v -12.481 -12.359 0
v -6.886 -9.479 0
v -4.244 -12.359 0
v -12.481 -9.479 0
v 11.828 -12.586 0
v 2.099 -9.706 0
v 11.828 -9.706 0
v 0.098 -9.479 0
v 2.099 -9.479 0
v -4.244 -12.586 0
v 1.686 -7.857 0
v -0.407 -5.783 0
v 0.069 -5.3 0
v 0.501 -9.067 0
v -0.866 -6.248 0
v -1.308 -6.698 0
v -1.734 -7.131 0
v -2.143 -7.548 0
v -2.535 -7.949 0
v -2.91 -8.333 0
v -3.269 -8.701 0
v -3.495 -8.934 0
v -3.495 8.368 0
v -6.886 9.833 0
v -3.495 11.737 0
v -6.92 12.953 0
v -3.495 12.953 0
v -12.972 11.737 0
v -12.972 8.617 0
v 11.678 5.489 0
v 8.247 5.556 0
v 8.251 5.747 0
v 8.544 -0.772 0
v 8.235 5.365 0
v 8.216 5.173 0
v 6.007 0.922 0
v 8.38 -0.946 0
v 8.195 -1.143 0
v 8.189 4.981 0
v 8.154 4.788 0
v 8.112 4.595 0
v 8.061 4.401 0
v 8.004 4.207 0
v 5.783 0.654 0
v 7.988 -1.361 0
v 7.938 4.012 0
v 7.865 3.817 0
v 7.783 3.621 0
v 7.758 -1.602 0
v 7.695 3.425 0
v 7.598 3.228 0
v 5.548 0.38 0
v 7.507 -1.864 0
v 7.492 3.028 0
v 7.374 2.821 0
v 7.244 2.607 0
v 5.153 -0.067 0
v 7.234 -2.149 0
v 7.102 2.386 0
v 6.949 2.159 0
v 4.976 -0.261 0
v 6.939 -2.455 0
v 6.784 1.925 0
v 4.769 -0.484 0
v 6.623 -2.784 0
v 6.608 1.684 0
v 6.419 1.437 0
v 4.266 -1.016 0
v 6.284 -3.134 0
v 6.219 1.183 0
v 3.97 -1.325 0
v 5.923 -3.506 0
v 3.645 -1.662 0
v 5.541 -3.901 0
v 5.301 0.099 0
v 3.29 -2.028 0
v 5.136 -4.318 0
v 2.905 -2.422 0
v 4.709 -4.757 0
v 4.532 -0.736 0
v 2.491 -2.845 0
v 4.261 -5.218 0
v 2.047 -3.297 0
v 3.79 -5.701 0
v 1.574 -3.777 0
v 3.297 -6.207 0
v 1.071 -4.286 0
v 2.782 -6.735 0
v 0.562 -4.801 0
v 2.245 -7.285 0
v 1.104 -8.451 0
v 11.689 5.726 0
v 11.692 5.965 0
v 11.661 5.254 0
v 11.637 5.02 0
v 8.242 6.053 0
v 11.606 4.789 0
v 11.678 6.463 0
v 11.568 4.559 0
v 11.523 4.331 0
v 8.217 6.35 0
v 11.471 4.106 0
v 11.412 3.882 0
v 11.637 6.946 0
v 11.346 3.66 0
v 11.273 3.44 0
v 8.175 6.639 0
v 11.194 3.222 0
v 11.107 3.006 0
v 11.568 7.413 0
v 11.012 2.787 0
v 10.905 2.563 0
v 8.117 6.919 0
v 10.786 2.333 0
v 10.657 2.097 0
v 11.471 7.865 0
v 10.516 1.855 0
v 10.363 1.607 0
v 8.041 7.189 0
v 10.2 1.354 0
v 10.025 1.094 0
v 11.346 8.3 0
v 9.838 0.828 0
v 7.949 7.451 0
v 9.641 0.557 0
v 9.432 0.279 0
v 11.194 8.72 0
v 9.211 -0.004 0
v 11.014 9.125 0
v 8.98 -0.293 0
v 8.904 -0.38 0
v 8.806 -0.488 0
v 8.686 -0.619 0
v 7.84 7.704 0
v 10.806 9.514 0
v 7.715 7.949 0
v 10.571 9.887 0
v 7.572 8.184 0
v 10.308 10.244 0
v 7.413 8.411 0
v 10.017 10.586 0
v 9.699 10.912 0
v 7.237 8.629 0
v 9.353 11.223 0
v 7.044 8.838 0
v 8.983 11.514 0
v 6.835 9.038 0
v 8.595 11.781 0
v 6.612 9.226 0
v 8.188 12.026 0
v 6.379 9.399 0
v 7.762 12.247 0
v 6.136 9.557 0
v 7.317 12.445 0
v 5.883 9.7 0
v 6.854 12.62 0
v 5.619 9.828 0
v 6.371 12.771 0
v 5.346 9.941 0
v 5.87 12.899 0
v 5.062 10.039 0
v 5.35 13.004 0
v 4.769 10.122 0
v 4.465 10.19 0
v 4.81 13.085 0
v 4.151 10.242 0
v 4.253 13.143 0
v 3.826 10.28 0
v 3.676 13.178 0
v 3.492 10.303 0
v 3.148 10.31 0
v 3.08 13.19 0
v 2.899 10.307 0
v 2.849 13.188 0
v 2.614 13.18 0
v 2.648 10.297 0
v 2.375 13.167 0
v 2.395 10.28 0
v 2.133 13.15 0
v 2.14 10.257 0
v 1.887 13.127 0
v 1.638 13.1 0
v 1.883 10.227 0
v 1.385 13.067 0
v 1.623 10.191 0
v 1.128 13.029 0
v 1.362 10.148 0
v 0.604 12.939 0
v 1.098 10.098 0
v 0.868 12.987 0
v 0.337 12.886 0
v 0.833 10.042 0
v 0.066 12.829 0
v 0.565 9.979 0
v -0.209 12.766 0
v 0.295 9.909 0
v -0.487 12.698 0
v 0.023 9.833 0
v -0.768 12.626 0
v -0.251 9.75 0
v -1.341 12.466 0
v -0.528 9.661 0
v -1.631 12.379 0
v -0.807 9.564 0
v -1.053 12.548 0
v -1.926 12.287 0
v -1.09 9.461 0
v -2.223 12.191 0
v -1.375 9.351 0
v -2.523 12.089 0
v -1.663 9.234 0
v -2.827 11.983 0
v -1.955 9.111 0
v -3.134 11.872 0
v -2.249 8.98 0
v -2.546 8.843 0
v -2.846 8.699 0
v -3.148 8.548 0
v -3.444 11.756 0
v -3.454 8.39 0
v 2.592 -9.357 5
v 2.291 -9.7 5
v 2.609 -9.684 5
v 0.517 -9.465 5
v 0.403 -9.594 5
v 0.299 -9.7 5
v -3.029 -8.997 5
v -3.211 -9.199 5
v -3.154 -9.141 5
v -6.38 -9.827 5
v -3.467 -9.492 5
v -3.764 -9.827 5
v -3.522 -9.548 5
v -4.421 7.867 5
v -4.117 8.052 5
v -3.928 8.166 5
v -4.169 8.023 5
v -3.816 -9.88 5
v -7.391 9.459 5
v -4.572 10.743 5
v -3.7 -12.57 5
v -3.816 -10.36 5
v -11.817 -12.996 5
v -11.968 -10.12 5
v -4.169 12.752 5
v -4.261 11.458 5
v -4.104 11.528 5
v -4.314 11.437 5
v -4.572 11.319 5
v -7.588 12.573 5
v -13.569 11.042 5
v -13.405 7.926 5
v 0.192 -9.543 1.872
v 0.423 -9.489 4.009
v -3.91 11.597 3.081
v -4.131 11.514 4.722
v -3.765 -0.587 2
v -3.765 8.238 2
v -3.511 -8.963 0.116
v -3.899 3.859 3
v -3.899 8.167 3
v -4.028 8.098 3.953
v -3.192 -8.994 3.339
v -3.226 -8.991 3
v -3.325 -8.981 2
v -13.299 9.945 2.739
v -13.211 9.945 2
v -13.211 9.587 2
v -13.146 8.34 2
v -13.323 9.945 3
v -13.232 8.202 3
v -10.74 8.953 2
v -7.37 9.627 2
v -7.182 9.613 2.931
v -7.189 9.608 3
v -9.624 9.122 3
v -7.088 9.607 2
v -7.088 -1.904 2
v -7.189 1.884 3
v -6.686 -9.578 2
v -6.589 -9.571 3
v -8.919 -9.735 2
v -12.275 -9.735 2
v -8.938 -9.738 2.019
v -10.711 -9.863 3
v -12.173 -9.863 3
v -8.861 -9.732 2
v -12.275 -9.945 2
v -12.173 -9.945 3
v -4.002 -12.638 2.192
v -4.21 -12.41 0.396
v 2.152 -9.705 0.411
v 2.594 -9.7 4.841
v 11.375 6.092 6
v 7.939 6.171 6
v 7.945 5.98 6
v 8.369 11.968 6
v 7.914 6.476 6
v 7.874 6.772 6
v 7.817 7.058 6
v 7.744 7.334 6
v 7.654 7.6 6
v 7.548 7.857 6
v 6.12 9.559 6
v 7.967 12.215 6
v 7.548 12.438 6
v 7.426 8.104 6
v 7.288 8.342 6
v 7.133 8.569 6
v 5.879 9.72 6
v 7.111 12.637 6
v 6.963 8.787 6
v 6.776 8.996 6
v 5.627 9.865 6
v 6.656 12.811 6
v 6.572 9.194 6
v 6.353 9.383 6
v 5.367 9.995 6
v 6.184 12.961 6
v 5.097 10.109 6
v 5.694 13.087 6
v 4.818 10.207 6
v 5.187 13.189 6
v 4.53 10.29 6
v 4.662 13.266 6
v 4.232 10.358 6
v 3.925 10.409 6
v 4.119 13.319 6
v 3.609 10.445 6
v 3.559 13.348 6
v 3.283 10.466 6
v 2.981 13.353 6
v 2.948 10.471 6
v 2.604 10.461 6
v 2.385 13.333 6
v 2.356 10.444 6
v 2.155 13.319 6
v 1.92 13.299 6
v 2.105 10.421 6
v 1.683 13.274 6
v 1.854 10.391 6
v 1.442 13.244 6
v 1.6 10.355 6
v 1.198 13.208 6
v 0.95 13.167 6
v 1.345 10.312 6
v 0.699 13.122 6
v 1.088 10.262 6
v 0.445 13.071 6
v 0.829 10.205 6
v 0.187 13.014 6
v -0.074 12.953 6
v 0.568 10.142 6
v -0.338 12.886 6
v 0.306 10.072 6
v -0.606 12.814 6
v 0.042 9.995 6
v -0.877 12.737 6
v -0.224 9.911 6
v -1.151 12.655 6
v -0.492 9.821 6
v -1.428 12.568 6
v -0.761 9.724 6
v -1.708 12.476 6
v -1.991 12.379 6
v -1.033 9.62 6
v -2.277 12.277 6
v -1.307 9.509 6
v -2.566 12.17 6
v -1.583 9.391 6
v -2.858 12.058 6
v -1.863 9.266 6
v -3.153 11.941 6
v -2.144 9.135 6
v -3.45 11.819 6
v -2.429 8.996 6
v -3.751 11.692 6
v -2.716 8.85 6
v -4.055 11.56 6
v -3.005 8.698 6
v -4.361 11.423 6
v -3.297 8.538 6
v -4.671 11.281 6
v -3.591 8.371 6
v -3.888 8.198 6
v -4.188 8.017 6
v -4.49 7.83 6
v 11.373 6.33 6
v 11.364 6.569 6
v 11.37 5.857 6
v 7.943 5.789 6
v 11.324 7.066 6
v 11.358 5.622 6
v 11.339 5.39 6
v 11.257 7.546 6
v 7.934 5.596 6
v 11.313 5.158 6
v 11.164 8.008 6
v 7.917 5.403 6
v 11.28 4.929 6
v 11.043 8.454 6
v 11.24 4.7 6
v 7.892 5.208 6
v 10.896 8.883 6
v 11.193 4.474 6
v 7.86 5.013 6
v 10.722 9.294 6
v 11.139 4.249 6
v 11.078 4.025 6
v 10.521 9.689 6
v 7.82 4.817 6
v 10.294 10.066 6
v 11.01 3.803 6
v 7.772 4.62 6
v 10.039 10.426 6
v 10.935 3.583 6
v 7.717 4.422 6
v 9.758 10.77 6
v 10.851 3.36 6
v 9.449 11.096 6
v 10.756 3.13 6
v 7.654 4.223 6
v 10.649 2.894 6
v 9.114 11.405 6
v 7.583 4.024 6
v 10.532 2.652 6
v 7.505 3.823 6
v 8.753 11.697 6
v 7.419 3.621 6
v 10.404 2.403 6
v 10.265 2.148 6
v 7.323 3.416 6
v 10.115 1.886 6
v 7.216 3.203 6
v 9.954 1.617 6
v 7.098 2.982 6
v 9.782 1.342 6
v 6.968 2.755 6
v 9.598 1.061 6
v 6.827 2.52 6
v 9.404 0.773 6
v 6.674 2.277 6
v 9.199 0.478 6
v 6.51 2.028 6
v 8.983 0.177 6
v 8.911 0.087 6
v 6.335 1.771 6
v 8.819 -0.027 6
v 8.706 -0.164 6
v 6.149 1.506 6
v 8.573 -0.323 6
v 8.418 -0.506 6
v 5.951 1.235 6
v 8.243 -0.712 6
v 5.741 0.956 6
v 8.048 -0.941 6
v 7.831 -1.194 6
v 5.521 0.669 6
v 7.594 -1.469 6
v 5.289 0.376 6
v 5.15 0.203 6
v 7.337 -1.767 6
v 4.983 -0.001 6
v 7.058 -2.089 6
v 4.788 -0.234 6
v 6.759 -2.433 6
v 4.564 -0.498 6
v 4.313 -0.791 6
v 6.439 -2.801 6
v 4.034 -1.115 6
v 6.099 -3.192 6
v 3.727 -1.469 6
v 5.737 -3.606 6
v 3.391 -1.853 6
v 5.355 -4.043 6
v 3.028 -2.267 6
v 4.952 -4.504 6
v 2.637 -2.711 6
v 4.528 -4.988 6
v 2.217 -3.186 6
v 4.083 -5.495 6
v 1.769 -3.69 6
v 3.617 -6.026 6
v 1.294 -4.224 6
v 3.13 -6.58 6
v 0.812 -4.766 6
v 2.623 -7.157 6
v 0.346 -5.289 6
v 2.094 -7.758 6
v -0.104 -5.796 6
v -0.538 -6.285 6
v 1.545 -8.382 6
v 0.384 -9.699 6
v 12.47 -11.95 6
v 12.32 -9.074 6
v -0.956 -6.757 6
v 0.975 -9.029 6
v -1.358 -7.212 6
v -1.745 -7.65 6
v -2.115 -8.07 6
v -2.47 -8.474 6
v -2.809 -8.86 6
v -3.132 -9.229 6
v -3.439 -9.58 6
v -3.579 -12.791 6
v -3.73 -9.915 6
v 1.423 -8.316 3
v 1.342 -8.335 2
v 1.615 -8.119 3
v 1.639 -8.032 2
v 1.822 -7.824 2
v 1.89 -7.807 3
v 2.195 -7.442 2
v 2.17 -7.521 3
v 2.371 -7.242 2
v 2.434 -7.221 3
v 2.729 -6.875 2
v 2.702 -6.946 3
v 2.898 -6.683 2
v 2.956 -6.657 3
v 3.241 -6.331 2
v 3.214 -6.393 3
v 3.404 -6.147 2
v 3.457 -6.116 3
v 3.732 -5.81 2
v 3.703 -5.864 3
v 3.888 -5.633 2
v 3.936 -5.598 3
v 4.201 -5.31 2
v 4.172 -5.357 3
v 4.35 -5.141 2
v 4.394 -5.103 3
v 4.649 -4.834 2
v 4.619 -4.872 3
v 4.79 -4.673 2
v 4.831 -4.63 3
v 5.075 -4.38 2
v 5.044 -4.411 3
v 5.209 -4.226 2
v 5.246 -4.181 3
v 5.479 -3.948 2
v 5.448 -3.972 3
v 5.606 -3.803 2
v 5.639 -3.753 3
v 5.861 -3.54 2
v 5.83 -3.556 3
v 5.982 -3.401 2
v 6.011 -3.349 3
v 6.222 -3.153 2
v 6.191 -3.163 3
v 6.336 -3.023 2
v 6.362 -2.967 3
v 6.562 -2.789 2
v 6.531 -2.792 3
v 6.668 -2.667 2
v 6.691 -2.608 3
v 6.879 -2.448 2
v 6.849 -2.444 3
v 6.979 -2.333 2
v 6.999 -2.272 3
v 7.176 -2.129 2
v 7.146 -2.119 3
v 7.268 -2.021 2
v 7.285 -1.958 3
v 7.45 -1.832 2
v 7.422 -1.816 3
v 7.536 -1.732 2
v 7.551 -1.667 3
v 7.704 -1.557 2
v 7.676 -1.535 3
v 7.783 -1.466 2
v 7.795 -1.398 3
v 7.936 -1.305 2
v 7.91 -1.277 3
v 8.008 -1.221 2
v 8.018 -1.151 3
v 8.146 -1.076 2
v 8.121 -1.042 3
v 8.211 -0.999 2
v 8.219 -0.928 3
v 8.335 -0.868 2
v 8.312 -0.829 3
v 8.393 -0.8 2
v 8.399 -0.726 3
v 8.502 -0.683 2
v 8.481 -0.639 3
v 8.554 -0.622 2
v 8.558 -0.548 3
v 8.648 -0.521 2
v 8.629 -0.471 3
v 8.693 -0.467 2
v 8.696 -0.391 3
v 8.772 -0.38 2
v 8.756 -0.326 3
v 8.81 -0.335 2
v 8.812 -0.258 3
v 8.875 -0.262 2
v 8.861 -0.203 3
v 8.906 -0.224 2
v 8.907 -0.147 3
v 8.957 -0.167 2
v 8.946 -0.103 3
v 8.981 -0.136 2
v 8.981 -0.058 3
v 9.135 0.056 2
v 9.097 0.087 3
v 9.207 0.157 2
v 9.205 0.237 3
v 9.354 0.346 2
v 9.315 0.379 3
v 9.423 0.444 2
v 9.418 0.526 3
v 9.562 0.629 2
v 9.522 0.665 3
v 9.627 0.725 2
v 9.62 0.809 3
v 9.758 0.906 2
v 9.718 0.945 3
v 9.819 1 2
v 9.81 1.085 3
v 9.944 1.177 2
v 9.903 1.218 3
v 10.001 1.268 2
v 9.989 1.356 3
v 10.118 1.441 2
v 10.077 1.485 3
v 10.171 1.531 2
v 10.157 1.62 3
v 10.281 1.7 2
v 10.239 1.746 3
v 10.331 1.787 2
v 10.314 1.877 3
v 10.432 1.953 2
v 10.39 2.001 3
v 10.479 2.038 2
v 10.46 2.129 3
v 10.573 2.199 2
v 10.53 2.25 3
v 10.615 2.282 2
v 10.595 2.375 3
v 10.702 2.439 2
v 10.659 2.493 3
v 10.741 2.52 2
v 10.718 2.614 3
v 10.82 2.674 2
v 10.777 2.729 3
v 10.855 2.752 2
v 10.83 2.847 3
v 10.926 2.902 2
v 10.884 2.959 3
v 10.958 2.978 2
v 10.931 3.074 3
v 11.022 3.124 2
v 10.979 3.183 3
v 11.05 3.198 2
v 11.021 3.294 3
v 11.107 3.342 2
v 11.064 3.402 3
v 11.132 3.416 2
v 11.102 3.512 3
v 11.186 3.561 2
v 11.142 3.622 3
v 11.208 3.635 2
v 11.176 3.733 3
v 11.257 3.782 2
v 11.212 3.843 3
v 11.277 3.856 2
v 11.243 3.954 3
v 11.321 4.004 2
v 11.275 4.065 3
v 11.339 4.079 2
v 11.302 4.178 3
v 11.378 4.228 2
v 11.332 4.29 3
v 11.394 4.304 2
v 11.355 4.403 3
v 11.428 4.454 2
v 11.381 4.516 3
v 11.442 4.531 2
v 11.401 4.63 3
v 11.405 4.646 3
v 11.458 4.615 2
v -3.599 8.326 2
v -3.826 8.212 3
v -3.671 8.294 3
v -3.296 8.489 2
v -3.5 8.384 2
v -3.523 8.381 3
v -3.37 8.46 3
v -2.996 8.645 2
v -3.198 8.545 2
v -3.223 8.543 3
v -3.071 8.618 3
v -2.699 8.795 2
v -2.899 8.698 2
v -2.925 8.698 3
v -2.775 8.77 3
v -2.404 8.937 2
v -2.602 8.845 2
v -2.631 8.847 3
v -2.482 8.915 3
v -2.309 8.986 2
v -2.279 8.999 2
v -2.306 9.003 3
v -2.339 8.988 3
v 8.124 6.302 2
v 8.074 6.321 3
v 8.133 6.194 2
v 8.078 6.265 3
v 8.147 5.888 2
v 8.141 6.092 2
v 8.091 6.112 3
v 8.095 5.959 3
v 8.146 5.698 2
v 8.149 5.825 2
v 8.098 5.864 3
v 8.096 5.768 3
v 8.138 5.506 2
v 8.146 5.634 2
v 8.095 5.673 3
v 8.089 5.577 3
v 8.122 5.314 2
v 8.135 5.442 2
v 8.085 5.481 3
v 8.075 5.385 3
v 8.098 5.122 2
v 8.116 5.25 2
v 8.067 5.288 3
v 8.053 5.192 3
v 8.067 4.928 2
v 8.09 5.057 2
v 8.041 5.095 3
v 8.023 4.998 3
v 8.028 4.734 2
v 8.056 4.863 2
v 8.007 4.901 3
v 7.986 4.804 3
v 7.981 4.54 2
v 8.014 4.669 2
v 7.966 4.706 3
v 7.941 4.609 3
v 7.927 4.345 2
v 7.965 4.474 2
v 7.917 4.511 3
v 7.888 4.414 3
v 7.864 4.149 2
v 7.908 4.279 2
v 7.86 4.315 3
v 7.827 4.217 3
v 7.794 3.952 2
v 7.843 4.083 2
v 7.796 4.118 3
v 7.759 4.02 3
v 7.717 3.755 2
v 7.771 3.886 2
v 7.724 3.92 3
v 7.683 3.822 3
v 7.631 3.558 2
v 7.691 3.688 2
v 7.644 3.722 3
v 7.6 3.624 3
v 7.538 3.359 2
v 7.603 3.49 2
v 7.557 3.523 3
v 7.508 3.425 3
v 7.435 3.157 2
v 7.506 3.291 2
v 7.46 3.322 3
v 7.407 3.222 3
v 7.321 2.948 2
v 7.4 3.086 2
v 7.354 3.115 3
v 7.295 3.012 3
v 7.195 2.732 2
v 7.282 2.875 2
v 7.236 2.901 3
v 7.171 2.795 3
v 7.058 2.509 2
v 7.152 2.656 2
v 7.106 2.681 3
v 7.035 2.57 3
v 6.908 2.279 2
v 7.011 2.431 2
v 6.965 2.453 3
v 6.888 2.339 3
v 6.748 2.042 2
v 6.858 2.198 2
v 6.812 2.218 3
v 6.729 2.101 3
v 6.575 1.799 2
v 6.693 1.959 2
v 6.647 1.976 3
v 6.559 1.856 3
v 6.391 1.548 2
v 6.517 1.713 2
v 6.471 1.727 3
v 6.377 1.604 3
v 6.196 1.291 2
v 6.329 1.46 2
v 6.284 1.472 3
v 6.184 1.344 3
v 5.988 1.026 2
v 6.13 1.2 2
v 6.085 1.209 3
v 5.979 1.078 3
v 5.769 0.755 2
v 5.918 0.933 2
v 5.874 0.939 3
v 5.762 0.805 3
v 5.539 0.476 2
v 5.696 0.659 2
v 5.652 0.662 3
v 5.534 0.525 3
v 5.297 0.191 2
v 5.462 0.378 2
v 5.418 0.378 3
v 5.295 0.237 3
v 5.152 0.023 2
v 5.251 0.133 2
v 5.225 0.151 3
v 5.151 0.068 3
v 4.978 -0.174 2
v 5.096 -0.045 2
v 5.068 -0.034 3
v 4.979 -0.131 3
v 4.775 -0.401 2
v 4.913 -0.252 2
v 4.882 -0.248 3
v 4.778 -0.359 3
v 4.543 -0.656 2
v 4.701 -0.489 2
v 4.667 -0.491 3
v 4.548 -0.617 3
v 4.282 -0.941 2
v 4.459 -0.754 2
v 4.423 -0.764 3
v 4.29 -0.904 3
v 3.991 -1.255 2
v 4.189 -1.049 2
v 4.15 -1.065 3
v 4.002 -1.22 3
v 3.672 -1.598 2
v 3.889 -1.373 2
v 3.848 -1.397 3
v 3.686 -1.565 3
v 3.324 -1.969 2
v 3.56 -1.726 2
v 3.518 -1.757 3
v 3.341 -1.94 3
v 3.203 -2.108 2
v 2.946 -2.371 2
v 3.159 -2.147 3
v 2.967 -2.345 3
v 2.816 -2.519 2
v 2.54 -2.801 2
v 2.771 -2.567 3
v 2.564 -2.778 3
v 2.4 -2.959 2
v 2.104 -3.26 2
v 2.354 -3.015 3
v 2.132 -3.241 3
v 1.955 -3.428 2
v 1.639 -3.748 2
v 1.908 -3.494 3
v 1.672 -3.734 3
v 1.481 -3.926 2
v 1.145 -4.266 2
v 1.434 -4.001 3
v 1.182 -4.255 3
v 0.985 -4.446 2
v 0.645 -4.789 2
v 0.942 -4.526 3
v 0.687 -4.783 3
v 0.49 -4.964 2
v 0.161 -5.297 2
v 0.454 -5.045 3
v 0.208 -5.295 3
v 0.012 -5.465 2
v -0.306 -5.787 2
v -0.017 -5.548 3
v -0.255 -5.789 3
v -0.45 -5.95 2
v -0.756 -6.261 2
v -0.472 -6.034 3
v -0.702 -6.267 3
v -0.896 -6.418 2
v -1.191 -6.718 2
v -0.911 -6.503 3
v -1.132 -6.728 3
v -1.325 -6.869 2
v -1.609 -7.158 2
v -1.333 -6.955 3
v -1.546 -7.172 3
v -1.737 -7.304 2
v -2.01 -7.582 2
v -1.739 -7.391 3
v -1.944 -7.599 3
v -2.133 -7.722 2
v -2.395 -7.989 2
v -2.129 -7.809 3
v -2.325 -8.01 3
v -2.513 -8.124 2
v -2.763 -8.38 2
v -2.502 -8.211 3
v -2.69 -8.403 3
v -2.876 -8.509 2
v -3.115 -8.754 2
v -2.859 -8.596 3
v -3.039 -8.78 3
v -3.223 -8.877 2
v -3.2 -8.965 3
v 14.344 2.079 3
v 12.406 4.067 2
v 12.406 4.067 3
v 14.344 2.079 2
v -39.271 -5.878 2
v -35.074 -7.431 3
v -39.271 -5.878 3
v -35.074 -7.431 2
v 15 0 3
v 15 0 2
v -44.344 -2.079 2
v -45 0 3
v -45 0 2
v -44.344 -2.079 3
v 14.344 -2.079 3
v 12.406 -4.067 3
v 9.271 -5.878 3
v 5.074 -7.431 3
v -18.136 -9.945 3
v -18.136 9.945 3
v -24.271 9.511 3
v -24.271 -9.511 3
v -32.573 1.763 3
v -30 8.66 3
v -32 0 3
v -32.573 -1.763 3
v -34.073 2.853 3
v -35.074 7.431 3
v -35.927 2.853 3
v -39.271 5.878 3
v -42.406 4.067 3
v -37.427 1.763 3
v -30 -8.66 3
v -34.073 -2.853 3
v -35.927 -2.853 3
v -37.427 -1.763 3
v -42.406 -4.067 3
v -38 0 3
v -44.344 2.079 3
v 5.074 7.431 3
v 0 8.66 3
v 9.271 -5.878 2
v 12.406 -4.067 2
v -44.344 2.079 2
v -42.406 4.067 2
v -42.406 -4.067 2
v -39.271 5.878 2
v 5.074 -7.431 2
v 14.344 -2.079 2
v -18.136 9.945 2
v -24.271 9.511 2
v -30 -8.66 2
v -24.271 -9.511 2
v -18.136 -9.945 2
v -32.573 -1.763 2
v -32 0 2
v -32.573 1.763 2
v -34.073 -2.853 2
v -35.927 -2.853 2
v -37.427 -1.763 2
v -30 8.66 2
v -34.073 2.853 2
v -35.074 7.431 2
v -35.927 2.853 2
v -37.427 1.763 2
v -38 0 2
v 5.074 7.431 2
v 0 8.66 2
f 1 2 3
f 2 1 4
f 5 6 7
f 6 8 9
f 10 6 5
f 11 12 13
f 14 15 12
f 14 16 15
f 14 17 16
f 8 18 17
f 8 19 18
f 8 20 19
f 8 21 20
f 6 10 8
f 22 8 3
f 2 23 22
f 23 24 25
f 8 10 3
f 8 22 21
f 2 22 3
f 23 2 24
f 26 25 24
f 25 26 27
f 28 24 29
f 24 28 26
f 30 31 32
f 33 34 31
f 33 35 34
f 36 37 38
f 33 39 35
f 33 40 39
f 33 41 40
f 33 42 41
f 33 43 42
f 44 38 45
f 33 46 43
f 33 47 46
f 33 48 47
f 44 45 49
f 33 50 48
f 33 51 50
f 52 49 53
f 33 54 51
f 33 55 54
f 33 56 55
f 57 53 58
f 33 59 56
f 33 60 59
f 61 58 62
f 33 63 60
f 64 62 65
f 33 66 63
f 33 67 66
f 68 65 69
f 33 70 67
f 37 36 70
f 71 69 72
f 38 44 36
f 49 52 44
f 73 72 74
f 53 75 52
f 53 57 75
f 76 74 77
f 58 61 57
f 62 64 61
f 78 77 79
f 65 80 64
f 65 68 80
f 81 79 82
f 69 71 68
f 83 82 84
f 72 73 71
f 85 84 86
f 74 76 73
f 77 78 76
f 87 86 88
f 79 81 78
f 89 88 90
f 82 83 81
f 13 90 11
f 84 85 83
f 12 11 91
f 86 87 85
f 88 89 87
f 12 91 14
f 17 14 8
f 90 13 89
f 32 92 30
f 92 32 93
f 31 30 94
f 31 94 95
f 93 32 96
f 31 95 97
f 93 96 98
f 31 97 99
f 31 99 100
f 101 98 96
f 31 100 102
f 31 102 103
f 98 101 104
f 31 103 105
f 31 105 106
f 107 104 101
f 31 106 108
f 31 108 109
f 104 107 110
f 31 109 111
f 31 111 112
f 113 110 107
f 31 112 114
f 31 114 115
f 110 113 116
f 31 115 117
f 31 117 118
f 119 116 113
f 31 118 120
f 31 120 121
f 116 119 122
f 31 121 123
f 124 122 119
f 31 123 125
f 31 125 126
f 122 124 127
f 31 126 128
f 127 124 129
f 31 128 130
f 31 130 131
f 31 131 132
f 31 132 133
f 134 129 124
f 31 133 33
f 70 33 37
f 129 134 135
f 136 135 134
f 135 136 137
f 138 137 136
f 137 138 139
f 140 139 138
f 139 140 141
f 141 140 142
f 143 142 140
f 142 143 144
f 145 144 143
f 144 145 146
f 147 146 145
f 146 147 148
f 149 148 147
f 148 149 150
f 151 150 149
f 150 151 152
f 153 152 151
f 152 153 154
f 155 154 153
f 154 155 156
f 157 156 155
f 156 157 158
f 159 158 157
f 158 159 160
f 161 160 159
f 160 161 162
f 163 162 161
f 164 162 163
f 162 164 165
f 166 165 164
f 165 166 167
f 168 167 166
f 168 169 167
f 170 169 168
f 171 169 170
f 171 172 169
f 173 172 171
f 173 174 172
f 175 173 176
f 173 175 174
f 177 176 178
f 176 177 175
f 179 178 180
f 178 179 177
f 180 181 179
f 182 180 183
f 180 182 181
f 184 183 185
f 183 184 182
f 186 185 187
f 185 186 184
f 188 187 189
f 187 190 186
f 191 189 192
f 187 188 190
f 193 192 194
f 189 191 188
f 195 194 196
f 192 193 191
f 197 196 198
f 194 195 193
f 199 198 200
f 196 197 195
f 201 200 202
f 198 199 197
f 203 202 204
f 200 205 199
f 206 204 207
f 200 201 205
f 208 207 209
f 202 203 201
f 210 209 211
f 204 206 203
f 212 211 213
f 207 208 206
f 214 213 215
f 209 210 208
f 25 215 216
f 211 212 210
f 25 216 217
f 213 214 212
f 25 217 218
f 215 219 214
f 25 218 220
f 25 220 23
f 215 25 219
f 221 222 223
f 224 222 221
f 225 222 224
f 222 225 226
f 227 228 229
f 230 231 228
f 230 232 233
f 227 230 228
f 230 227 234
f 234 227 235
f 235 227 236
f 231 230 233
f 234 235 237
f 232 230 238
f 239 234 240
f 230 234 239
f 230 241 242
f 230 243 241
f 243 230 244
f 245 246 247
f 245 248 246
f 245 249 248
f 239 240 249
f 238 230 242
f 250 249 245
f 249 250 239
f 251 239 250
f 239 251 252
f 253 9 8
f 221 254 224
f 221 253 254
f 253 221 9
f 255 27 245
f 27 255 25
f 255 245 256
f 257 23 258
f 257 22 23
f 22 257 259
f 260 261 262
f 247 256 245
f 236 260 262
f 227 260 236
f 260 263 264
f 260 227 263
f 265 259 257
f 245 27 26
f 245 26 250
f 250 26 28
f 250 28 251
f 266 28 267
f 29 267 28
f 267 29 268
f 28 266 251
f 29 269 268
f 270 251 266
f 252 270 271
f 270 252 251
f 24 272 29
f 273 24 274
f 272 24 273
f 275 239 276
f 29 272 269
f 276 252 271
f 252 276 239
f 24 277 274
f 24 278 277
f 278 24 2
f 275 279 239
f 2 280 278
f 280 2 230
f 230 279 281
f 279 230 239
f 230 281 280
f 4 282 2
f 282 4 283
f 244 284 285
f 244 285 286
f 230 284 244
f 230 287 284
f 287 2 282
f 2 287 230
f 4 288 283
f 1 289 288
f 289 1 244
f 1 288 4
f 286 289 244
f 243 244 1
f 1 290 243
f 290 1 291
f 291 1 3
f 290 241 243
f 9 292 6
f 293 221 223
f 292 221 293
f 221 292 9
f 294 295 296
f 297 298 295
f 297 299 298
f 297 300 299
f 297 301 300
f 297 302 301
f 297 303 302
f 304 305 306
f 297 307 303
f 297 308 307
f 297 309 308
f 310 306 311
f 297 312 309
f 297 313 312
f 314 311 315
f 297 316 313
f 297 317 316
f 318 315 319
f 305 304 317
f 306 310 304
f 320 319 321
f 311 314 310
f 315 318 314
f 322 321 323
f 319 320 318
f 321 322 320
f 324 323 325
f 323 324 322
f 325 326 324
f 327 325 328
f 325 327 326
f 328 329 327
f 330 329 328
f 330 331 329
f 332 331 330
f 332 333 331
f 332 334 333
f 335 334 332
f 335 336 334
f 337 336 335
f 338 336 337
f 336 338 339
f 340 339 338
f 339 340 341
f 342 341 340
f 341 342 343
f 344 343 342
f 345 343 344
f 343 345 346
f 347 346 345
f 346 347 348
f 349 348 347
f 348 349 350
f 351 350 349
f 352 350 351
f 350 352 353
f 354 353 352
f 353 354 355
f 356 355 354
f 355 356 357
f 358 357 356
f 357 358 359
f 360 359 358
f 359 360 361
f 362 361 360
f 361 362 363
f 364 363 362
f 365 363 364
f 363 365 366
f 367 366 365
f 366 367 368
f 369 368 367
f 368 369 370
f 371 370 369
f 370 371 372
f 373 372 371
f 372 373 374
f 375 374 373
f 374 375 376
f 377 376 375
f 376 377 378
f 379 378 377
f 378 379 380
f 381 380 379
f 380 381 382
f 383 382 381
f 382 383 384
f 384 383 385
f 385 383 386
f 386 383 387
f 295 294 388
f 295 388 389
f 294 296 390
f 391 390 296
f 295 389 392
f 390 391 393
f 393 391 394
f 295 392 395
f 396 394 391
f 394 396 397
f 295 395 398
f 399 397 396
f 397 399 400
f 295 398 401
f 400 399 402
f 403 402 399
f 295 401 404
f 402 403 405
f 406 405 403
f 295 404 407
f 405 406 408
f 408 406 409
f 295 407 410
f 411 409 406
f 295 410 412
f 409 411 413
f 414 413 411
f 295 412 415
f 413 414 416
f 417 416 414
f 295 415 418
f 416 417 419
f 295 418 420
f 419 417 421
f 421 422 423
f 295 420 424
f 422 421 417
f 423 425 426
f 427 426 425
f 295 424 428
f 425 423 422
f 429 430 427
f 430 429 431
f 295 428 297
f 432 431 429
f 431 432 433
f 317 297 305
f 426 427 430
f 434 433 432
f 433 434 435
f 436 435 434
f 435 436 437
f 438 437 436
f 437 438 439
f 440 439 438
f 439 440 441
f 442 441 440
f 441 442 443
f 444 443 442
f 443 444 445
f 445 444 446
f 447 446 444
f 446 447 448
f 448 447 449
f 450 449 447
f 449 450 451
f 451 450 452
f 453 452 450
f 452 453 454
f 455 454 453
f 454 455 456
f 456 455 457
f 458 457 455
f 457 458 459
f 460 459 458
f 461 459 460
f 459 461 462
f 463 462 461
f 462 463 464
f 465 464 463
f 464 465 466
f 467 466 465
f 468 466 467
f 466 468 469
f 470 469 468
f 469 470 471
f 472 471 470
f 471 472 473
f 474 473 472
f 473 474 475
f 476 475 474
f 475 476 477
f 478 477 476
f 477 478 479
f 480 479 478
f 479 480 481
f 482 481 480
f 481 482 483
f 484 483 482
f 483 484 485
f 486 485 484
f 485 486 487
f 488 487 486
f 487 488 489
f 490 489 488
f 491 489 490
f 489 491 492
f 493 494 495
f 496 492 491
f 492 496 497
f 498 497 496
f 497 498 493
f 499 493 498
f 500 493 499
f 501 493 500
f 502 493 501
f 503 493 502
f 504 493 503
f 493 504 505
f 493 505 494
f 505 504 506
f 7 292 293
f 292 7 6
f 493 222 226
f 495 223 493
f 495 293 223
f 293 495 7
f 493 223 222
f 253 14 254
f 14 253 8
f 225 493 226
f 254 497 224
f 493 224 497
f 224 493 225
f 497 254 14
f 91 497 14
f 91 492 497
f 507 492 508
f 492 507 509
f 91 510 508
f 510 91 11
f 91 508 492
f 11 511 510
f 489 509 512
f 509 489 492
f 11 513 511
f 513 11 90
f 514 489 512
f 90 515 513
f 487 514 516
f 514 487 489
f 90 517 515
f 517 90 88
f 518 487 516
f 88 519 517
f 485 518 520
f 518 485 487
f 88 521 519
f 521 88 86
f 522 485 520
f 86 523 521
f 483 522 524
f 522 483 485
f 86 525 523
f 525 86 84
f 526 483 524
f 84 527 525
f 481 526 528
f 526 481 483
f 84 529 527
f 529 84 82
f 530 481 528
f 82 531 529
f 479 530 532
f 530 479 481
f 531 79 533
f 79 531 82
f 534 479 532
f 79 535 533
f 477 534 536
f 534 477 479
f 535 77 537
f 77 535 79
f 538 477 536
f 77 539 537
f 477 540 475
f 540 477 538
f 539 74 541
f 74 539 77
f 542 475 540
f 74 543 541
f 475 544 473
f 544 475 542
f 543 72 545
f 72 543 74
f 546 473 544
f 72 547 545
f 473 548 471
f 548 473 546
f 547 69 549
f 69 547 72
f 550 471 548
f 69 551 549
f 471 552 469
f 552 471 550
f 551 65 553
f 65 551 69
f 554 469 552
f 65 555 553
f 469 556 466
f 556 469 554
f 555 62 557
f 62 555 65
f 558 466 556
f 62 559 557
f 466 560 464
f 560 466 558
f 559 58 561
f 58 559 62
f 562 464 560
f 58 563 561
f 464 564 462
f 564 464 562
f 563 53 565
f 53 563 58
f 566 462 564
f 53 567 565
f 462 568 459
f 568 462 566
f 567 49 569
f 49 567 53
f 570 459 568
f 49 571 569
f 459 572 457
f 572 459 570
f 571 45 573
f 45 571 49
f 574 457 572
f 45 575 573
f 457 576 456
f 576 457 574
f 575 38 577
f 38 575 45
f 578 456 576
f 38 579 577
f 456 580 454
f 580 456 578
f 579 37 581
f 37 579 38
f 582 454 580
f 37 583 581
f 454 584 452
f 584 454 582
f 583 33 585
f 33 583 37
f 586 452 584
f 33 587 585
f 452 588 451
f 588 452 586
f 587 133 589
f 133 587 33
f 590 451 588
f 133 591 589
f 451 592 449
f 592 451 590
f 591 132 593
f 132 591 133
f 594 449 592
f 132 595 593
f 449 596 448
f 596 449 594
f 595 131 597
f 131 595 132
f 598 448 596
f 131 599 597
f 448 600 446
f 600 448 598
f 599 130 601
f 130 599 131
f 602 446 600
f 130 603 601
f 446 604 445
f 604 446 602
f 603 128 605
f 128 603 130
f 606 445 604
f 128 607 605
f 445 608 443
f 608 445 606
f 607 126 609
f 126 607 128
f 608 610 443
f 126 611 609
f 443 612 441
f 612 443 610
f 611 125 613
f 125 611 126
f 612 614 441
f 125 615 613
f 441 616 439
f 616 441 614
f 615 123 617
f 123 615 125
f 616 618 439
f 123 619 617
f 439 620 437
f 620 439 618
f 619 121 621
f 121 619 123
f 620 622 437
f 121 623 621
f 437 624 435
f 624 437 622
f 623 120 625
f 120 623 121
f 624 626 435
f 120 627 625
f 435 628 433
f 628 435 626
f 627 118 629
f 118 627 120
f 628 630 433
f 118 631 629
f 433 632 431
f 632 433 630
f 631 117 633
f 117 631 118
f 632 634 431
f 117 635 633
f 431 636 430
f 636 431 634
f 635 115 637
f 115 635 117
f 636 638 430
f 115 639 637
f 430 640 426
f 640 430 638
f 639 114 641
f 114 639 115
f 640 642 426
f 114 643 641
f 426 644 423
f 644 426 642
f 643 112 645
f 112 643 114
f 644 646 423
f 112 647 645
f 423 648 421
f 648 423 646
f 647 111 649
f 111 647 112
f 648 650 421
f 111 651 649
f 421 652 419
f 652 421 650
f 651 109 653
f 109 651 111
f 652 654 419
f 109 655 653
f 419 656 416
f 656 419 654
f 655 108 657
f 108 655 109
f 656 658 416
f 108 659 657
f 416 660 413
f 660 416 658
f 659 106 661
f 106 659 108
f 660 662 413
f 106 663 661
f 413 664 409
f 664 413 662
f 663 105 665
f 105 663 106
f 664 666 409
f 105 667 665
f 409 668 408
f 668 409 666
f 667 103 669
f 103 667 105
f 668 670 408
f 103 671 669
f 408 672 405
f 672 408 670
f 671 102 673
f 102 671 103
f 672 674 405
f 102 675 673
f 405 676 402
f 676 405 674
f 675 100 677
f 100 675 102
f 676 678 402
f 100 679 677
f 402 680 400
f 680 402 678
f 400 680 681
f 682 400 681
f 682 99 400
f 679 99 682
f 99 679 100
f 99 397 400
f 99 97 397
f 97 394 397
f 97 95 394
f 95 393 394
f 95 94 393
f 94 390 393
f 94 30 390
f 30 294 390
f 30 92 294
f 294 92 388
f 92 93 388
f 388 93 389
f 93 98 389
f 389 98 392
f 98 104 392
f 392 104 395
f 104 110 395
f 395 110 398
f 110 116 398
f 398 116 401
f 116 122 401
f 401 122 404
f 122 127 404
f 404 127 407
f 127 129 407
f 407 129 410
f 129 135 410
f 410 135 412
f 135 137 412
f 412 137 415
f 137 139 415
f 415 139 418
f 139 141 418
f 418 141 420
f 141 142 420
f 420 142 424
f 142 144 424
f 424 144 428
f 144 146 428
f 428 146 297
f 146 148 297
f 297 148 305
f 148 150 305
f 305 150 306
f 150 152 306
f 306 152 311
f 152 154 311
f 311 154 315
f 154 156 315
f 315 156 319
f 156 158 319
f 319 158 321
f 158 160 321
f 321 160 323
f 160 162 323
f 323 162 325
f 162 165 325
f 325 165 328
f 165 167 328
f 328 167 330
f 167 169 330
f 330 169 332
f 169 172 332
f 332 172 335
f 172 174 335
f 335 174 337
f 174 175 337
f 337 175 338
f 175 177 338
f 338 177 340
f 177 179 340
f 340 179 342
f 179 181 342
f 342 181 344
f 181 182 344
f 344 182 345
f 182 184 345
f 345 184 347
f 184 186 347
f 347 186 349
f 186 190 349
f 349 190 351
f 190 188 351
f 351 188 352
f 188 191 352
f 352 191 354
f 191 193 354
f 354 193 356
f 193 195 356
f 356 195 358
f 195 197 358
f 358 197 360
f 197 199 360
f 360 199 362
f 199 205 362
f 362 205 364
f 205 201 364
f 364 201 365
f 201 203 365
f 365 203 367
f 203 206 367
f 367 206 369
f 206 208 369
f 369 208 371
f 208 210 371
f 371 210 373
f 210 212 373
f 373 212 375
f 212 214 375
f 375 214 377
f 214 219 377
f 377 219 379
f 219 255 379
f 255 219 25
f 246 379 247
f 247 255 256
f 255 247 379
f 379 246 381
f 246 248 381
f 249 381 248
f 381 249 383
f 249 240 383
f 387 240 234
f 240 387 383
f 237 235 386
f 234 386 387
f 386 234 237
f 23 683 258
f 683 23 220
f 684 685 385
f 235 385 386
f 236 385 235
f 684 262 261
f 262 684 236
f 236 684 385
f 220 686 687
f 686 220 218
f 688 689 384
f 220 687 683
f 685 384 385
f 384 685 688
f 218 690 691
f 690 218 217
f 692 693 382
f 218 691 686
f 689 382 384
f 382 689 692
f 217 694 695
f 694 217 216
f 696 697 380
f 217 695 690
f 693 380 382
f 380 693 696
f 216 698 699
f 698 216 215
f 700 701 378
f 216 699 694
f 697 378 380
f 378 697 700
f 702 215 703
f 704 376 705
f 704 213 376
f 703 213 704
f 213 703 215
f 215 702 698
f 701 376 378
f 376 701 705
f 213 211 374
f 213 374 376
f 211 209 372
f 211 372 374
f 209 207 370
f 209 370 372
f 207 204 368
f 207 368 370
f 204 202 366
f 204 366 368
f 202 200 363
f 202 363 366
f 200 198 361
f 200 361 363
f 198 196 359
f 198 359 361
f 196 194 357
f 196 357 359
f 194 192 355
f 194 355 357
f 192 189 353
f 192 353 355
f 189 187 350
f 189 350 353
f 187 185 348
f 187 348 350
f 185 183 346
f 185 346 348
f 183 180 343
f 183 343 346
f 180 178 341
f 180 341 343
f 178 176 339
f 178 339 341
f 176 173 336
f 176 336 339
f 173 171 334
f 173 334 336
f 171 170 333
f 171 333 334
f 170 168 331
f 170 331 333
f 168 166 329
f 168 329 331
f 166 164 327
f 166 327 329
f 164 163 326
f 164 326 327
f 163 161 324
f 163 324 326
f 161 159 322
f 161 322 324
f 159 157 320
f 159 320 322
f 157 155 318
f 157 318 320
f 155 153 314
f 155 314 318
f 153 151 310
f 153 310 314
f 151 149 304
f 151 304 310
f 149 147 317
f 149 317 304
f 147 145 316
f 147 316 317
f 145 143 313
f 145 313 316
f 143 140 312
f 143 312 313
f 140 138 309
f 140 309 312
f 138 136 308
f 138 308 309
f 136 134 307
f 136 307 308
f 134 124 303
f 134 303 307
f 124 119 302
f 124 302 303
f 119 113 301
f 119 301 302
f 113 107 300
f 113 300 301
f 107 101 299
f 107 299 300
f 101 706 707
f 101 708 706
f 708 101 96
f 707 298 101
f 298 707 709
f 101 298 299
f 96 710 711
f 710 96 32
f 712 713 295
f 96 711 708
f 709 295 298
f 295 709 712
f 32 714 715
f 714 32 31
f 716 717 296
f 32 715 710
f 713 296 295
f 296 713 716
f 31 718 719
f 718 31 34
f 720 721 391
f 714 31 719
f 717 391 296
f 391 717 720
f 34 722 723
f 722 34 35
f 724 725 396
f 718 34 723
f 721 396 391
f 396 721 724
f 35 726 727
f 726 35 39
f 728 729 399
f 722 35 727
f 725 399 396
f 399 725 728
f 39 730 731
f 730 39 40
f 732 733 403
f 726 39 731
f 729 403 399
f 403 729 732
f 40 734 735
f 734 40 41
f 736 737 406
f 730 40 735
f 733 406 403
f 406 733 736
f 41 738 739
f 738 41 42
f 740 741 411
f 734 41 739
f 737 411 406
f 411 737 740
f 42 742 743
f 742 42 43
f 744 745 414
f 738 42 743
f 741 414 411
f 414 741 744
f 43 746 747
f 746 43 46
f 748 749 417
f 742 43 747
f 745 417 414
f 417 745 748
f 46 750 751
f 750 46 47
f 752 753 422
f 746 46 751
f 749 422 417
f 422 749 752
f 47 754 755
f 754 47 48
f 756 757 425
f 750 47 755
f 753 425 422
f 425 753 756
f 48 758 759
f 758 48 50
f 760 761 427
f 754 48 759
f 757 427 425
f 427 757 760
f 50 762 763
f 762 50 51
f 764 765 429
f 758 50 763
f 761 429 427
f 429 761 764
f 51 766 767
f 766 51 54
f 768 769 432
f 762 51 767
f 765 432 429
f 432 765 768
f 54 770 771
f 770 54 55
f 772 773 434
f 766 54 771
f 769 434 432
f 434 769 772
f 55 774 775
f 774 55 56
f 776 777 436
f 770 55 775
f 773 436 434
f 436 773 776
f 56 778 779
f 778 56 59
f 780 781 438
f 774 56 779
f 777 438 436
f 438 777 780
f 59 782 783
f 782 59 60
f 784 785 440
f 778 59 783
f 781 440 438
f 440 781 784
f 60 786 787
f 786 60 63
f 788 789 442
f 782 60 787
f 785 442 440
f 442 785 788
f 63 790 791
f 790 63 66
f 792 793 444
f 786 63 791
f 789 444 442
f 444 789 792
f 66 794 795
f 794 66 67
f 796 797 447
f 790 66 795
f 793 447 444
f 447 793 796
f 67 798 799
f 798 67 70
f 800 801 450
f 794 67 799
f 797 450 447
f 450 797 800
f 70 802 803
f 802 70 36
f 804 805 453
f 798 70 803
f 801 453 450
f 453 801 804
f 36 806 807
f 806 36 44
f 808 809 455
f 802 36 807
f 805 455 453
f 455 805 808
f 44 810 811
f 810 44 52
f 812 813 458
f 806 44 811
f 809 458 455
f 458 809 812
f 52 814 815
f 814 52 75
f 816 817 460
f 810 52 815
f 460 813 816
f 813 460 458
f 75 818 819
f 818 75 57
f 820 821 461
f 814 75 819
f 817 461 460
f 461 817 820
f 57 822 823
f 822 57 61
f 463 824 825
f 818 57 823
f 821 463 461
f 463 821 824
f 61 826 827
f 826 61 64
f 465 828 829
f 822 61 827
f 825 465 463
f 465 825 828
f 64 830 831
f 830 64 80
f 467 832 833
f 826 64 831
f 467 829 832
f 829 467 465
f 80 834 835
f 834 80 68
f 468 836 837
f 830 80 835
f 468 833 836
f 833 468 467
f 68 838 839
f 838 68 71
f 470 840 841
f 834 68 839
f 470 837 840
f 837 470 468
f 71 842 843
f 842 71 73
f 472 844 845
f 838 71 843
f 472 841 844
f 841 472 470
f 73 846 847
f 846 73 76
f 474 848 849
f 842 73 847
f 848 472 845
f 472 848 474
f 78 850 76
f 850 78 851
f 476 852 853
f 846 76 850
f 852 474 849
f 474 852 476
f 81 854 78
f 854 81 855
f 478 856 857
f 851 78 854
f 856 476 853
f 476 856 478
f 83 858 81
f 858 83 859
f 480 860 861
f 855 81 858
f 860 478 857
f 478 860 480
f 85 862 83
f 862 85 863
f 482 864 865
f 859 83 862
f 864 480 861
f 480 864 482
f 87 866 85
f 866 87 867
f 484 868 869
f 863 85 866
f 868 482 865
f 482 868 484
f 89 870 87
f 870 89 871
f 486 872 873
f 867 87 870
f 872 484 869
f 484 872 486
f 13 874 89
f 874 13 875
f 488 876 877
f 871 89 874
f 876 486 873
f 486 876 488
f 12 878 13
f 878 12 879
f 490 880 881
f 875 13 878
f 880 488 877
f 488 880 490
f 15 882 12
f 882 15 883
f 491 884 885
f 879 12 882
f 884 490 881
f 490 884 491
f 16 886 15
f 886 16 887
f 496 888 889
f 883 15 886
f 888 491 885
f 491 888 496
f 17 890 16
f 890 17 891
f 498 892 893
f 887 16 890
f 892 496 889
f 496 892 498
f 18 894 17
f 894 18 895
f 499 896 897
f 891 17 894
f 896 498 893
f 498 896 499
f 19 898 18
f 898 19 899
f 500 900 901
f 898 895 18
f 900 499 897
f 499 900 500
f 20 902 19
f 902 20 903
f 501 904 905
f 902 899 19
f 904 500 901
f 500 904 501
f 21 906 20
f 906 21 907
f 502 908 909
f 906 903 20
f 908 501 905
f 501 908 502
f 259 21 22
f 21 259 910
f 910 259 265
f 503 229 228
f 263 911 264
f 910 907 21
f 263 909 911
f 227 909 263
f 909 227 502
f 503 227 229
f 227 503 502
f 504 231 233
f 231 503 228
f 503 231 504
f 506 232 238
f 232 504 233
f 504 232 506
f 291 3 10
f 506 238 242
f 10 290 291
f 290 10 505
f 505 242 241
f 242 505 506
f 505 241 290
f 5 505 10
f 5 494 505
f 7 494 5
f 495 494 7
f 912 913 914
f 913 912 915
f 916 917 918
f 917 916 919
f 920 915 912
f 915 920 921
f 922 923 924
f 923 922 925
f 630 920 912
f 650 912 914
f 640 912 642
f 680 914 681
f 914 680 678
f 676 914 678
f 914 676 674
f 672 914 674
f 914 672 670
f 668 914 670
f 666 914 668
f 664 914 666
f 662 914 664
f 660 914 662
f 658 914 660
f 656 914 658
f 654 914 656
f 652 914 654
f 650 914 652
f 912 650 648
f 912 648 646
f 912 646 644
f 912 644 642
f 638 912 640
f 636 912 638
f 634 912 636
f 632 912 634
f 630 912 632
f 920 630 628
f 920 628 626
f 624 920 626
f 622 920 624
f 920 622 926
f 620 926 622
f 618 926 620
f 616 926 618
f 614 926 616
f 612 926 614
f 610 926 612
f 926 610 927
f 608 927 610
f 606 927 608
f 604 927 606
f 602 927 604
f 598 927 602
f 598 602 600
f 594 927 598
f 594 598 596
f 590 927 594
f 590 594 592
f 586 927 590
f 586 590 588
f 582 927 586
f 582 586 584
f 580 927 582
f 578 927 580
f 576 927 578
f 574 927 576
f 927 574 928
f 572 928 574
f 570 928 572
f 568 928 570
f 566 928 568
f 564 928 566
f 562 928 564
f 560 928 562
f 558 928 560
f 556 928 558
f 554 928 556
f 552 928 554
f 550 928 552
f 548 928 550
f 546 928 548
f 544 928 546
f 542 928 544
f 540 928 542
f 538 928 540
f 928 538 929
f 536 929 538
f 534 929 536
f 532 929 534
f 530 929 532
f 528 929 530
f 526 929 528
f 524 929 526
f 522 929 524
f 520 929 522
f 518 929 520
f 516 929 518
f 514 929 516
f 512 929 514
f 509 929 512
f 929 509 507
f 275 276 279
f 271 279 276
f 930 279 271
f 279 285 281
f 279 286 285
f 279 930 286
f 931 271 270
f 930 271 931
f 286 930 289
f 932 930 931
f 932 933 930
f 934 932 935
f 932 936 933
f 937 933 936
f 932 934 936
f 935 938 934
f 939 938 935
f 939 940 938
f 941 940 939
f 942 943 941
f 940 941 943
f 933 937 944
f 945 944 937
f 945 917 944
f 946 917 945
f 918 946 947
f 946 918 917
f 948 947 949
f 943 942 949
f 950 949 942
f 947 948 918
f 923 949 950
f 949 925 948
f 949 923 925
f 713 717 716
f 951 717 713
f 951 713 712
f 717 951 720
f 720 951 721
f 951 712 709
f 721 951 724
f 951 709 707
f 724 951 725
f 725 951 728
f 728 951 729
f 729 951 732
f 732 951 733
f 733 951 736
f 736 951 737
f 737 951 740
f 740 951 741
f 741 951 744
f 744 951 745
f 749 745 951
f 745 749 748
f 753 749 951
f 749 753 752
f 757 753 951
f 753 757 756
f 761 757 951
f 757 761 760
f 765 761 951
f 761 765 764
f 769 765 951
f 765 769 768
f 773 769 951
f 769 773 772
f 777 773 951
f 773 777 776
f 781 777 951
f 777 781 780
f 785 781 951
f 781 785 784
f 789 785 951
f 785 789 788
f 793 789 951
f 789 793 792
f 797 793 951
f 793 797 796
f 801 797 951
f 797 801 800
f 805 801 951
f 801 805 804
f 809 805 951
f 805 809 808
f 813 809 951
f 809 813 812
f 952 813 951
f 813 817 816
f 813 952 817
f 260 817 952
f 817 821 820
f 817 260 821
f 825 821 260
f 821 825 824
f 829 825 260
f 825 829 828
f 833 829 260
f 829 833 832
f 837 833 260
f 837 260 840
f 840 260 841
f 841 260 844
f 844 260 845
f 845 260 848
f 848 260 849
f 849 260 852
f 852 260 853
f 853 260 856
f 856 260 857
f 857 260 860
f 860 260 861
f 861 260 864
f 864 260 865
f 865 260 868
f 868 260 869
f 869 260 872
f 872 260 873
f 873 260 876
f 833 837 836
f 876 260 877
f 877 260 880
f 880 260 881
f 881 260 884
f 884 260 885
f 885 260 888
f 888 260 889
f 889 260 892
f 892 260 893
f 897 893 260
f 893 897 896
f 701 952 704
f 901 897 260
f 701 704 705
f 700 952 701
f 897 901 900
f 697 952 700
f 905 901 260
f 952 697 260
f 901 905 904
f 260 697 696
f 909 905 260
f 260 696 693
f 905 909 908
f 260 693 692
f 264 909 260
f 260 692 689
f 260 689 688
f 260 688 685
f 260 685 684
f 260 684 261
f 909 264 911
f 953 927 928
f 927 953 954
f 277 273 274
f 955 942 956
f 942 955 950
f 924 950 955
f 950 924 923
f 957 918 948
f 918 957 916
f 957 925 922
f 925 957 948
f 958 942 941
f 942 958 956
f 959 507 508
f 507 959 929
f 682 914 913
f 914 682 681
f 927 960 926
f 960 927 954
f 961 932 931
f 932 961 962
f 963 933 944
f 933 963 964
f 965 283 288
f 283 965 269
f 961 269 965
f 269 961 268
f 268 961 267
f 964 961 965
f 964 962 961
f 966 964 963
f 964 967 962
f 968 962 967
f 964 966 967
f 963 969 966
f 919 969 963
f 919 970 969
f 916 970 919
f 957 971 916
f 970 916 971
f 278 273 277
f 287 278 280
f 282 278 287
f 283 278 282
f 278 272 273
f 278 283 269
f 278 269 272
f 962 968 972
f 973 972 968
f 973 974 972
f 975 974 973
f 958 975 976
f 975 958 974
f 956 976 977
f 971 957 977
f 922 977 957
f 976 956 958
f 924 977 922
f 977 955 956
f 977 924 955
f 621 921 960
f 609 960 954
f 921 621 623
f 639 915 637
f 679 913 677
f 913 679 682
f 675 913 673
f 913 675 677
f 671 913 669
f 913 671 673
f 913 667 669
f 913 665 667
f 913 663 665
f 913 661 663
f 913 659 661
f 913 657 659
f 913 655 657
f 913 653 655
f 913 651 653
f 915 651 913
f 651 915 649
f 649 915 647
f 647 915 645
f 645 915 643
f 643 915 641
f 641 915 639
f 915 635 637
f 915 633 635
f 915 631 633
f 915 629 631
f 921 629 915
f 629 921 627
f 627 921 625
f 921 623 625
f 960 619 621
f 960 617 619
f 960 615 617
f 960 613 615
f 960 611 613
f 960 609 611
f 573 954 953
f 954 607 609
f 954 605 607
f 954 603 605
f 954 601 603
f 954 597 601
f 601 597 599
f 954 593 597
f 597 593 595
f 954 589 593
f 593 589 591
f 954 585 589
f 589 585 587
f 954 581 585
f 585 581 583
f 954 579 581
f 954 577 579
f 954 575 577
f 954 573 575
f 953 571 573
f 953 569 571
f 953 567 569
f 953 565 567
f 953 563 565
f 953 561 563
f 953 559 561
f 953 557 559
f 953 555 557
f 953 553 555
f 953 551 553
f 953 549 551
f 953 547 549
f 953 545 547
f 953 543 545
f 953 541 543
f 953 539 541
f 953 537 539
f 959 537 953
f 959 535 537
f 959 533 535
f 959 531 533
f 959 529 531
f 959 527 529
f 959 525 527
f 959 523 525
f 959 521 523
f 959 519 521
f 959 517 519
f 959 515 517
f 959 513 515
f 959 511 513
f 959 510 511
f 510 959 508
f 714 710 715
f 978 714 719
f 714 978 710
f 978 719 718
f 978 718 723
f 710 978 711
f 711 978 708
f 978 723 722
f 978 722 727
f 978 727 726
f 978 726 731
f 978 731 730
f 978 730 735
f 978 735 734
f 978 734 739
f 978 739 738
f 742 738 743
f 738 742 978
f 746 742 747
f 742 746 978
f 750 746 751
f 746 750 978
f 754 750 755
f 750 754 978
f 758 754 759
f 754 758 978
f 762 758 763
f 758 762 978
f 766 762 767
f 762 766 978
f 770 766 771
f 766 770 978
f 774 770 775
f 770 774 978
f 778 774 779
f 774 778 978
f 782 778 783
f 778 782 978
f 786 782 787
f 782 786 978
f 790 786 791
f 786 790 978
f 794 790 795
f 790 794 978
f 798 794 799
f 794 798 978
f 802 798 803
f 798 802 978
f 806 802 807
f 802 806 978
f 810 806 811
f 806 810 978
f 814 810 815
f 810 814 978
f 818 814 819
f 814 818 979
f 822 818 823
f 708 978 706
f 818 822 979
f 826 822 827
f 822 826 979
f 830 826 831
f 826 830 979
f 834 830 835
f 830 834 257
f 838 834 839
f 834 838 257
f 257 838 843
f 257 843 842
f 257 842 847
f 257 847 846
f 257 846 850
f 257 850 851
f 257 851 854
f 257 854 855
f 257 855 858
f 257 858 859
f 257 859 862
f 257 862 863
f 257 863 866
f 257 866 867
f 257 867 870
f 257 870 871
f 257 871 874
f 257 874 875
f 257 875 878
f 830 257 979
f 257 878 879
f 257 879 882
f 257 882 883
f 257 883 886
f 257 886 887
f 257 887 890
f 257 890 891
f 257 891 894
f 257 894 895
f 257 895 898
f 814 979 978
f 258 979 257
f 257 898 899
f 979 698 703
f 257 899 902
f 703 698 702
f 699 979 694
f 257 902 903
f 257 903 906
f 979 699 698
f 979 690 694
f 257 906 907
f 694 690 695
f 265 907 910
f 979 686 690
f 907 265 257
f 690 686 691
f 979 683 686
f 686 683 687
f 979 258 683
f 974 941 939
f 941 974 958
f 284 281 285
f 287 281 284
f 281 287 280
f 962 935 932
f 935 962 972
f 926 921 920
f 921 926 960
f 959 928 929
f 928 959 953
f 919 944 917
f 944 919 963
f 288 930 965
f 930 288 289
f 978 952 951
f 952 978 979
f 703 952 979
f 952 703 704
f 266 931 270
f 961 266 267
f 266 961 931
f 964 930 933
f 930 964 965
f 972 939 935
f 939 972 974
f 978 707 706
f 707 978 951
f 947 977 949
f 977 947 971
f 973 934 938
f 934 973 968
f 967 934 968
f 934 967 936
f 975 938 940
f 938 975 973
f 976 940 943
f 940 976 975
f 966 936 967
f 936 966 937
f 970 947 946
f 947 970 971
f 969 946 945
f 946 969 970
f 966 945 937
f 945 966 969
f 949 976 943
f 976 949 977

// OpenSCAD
Font_name = "Chewy"; // Font utilizzato

number = "12"; // numero da stampare
height = [5,6,4,5,4,3,5,4,6,4,3,5,4,6]; // varia l'altezza di ogni numero della scritta
spacing = [10,10,10,10,10,10,10,10]; // spazio tra i numeri

twist = -3; // [-10:0.5:10] effetto tridimensionale del singolo numero da stampare
center = 6; // [0:1:70] twist rotation

module targhetta(Text) {

    for (i = [0 : len(Text) -1]) {
       linear_extrude(height = height[i], twist = twist, $fn = 100) {
            translate ([(spacing[i]*i)-center,0,0])
            text(size = 25, text = Text[i], font = Font_name, halign = "center", valign= "center", $fn = 100);
        }
    }
}

targhetta(number);
difference(){
scale([1.5,0.5,1])translate([-10,0,2])linear_extrude(1) circle(20);
translate([-35,0,0])cylinder(5,3,3);
}
